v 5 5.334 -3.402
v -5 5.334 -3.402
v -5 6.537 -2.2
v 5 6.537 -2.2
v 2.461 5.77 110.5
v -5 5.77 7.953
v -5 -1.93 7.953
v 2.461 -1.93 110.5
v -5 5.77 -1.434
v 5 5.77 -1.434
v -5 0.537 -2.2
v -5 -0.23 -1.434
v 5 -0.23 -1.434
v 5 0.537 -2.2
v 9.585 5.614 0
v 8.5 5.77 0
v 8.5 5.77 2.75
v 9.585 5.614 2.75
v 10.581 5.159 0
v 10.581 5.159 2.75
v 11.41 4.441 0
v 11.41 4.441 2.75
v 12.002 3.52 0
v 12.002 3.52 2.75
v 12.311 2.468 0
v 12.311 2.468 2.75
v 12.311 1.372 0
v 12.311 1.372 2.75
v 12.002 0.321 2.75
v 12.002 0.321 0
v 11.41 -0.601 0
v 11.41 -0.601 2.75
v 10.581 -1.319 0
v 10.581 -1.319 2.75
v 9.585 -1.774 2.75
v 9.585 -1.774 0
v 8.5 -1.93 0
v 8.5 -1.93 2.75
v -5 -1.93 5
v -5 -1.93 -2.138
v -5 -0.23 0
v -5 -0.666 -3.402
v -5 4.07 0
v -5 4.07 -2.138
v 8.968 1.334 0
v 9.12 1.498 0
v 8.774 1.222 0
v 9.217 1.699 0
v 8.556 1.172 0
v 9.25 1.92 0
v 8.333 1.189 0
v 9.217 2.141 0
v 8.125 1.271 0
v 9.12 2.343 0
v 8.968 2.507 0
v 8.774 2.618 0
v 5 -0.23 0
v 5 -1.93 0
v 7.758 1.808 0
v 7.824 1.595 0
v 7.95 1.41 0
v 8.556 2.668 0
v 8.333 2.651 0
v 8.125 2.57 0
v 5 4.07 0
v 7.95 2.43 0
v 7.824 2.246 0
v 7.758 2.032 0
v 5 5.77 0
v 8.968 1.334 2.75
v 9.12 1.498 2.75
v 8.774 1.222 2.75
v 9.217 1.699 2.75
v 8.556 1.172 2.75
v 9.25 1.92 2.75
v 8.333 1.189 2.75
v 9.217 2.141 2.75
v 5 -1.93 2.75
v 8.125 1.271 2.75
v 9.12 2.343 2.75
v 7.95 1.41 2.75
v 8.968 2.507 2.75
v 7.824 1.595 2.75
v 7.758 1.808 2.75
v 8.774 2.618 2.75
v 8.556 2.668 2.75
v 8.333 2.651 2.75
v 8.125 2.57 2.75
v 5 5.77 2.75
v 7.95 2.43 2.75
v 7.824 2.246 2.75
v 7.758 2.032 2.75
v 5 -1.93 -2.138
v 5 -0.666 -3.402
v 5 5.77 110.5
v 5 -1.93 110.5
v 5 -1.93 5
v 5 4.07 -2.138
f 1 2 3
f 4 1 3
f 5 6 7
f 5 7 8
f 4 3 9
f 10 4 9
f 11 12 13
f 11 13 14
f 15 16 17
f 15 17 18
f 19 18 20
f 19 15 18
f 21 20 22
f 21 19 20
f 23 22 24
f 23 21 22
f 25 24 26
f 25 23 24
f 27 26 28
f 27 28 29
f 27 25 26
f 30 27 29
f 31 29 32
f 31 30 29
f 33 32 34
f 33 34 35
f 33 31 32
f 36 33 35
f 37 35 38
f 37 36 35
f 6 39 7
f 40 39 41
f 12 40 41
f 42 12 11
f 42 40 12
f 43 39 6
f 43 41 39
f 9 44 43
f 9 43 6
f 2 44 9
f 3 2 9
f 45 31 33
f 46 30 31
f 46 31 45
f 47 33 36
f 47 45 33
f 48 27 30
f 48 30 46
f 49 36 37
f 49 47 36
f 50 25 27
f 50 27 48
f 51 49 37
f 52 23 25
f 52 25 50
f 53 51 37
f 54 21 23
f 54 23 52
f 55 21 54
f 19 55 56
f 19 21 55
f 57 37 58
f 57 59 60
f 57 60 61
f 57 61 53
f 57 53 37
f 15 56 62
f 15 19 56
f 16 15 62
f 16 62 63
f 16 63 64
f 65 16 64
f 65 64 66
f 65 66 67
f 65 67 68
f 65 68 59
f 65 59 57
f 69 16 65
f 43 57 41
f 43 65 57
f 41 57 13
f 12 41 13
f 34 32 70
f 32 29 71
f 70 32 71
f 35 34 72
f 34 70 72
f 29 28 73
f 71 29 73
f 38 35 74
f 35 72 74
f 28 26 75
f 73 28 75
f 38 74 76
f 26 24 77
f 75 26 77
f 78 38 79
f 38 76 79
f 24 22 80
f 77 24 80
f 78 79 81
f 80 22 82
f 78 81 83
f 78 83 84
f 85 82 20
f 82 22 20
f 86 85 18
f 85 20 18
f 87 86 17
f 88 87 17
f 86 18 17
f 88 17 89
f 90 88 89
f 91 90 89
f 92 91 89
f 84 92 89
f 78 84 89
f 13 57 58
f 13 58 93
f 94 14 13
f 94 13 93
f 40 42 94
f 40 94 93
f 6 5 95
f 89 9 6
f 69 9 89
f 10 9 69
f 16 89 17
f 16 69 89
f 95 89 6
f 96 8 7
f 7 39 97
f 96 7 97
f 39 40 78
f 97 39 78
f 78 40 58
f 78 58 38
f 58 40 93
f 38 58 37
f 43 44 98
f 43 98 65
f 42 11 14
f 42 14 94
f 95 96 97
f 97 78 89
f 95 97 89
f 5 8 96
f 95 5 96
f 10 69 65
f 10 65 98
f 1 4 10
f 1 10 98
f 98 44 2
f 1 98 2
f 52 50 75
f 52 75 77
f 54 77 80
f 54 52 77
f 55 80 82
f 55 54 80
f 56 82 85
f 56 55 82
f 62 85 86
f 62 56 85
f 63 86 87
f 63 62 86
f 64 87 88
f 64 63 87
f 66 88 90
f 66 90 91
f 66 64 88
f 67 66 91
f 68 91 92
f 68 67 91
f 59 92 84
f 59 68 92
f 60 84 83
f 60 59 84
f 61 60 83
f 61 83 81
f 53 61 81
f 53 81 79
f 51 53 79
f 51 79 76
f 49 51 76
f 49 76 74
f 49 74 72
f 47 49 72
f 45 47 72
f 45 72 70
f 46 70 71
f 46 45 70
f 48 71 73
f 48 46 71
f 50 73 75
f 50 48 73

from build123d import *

# Parameters (mm, degrees)
SKETCH2_W           = 10
SKETCH2_H           = 14.768412439
BOSS_EXTRUDE1_DEPTH = 5
BOSS_EXTRUDE4_DEPTH = 10
SKETCH9_W           = 10
SKETCH9_H           = 3.18
SKETCH9_H_2         = 3.888412439
CUT_EXTRUDE3_DEPTH  = 5
BOSS_EXTRUDE5_DEPTH = 7.7
SKETCH12_R          = 0.75
BOSS_EXTRUDE7_DEPTH = 2.75
FILLET1_R           = 2.5
SKETCH13_W          = 17.887250462
SKETCH13_H          = 46.229219396
CUT_EXTRUDE4_DEPTH  = 20
SKETCH15_W          = 10
SKETCH15_H          = 7.7
BOSS_EXTRUDE9_DEPTH = 100
CUT_EXTRUDE5_DEPTH  = 100


with BuildPart() as part:
    # Sketch2 → Boss-Extrude1 (new body)
    with BuildSketch(Plane.XY):
        with Locations((0, 1.566049366)):
            Rectangle(SKETCH2_W, SKETCH2_H)
    extrude(amount=BOSS_EXTRUDE1_DEPTH)

    # Sketch8 → Boss-Extrude4 (add)
    with BuildSketch(Plane.ZY.offset(5)):
        Polygon((-0.15, 5.770255585), (0, 5.770255585), (0, 4.070255585), (-0.15, 4.070255585), (-2.137867966, 4.070255585), (-3.402081528, 5.334469147), (-2.2, 6.536550675), (-1.43370491, 5.770255585), align=None)
        Polygon((-0.15, -1.929744415), (0, -1.929744415), (0, -0.229744415), (-0.15, -0.229744415), (-1.43370491, -0.229744415), (-2.2, 0.536550675), (-3.402081528, -0.665530853), (-2.137867966, -1.929744415), align=None)
    extrude(amount=-BOSS_EXTRUDE4_DEPTH)

    # Sketch9 → Cut-Extrude3 (cut)
    with BuildSketch(Plane(origin=(0, 0, 0), x_dir=(-1, 0, 0), z_dir=(0, 0, -1))):
        with Locations((0, 7.360255585)):
            Rectangle(SKETCH9_W, SKETCH9_H)
        with Locations((0, -3.873950635)):
            Rectangle(SKETCH9_W, SKETCH9_H_2)
    extrude(amount=-CUT_EXTRUDE3_DEPTH, mode=Mode.SUBTRACT)

    # Sketch10 → Boss-Extrude5 (add)
    with BuildSketch(Plane(origin=(0, 5.770255585, 0), x_dir=(1, 0, 0), z_dir=(0, 1, 0))):
        with BuildLine():
            Line((-5, -5), (-5, -10.5))
            Line((-5, -10.5), (1.352445729, -55.7))
            Line((1.352445729, -55.7), (6.352445729, -55.7))
            Line((6.352445729, -55.7), (6.352445729, -49.2))
            ThreePointArc((6.352445729, -49.2), (1.383429579, -31.764936646), (5, -14))
            Line((5, -14), (5, -5))
            Line((5, -5), (-5, -5))
        make_face()
    extrude(amount=-BOSS_EXTRUDE5_DEPTH)

    # Sketch12 → Boss-Extrude7 (add)
    with BuildSketch(Plane.XY):
        with BuildLine():
            Line((5, 5.770255585), (8.5, 5.770255585))
            ThreePointArc((8.5, 5.770255585), (12.35, 1.920255585), (8.5, -1.929744415))
            Line((8.5, -1.929744415), (5, -1.929744415))
            Line((5, -1.929744415), (5, 5.770255585))
        make_face()
        with Locations((8.5, 1.920255585)):
            Circle(SKETCH12_R, mode=Mode.SUBTRACT)
    extrude(amount=BOSS_EXTRUDE7_DEPTH)

    # Fillet1
    fillet1_edges = [part.edges().sort_by_distance(p)[0] for p in [
        (6.352445729, 1.920255585, 49.2),
        (5, 1.920255585, 14),
        (1.352445729, 1.920255585, 55.7),
        (6.352445729, 1.920255585, 55.7),
    ]]
    fillet(fillet1_edges, radius=FILLET1_R)

    # Sketch13 → Cut-Extrude4 (cut)
    with BuildSketch(Plane(origin=(0, 5.770255585, 0), x_dir=(1, 0, 0), z_dir=(0, 1, 0))):
        with Locations((3.943625231, -33.614609698)):
            Rectangle(SKETCH13_W, SKETCH13_H)
    extrude(amount=-CUT_EXTRUDE4_DEPTH, mode=Mode.SUBTRACT)

    # Sketch15 → Boss-Extrude9 (add)
    with BuildSketch(Plane.XY.offset(10.5)):
        with Locations((0, 1.920255585)):
            Rectangle(SKETCH15_W, SKETCH15_H)
    extrude(amount=BOSS_EXTRUDE9_DEPTH)

    # Sketch16 → Cut-Extrude5 (cut)
    with BuildSketch(Plane(origin=(0, 5.770255585, 0), x_dir=(1, 0, 0), z_dir=(0, 1, 0))):
        Polygon((-5, -7.952810564), (2.461220142, -110.5), (-5, -110.5), align=None)
    extrude(amount=-CUT_EXTRUDE5_DEPTH, mode=Mode.SUBTRACT)


solid = part.part
